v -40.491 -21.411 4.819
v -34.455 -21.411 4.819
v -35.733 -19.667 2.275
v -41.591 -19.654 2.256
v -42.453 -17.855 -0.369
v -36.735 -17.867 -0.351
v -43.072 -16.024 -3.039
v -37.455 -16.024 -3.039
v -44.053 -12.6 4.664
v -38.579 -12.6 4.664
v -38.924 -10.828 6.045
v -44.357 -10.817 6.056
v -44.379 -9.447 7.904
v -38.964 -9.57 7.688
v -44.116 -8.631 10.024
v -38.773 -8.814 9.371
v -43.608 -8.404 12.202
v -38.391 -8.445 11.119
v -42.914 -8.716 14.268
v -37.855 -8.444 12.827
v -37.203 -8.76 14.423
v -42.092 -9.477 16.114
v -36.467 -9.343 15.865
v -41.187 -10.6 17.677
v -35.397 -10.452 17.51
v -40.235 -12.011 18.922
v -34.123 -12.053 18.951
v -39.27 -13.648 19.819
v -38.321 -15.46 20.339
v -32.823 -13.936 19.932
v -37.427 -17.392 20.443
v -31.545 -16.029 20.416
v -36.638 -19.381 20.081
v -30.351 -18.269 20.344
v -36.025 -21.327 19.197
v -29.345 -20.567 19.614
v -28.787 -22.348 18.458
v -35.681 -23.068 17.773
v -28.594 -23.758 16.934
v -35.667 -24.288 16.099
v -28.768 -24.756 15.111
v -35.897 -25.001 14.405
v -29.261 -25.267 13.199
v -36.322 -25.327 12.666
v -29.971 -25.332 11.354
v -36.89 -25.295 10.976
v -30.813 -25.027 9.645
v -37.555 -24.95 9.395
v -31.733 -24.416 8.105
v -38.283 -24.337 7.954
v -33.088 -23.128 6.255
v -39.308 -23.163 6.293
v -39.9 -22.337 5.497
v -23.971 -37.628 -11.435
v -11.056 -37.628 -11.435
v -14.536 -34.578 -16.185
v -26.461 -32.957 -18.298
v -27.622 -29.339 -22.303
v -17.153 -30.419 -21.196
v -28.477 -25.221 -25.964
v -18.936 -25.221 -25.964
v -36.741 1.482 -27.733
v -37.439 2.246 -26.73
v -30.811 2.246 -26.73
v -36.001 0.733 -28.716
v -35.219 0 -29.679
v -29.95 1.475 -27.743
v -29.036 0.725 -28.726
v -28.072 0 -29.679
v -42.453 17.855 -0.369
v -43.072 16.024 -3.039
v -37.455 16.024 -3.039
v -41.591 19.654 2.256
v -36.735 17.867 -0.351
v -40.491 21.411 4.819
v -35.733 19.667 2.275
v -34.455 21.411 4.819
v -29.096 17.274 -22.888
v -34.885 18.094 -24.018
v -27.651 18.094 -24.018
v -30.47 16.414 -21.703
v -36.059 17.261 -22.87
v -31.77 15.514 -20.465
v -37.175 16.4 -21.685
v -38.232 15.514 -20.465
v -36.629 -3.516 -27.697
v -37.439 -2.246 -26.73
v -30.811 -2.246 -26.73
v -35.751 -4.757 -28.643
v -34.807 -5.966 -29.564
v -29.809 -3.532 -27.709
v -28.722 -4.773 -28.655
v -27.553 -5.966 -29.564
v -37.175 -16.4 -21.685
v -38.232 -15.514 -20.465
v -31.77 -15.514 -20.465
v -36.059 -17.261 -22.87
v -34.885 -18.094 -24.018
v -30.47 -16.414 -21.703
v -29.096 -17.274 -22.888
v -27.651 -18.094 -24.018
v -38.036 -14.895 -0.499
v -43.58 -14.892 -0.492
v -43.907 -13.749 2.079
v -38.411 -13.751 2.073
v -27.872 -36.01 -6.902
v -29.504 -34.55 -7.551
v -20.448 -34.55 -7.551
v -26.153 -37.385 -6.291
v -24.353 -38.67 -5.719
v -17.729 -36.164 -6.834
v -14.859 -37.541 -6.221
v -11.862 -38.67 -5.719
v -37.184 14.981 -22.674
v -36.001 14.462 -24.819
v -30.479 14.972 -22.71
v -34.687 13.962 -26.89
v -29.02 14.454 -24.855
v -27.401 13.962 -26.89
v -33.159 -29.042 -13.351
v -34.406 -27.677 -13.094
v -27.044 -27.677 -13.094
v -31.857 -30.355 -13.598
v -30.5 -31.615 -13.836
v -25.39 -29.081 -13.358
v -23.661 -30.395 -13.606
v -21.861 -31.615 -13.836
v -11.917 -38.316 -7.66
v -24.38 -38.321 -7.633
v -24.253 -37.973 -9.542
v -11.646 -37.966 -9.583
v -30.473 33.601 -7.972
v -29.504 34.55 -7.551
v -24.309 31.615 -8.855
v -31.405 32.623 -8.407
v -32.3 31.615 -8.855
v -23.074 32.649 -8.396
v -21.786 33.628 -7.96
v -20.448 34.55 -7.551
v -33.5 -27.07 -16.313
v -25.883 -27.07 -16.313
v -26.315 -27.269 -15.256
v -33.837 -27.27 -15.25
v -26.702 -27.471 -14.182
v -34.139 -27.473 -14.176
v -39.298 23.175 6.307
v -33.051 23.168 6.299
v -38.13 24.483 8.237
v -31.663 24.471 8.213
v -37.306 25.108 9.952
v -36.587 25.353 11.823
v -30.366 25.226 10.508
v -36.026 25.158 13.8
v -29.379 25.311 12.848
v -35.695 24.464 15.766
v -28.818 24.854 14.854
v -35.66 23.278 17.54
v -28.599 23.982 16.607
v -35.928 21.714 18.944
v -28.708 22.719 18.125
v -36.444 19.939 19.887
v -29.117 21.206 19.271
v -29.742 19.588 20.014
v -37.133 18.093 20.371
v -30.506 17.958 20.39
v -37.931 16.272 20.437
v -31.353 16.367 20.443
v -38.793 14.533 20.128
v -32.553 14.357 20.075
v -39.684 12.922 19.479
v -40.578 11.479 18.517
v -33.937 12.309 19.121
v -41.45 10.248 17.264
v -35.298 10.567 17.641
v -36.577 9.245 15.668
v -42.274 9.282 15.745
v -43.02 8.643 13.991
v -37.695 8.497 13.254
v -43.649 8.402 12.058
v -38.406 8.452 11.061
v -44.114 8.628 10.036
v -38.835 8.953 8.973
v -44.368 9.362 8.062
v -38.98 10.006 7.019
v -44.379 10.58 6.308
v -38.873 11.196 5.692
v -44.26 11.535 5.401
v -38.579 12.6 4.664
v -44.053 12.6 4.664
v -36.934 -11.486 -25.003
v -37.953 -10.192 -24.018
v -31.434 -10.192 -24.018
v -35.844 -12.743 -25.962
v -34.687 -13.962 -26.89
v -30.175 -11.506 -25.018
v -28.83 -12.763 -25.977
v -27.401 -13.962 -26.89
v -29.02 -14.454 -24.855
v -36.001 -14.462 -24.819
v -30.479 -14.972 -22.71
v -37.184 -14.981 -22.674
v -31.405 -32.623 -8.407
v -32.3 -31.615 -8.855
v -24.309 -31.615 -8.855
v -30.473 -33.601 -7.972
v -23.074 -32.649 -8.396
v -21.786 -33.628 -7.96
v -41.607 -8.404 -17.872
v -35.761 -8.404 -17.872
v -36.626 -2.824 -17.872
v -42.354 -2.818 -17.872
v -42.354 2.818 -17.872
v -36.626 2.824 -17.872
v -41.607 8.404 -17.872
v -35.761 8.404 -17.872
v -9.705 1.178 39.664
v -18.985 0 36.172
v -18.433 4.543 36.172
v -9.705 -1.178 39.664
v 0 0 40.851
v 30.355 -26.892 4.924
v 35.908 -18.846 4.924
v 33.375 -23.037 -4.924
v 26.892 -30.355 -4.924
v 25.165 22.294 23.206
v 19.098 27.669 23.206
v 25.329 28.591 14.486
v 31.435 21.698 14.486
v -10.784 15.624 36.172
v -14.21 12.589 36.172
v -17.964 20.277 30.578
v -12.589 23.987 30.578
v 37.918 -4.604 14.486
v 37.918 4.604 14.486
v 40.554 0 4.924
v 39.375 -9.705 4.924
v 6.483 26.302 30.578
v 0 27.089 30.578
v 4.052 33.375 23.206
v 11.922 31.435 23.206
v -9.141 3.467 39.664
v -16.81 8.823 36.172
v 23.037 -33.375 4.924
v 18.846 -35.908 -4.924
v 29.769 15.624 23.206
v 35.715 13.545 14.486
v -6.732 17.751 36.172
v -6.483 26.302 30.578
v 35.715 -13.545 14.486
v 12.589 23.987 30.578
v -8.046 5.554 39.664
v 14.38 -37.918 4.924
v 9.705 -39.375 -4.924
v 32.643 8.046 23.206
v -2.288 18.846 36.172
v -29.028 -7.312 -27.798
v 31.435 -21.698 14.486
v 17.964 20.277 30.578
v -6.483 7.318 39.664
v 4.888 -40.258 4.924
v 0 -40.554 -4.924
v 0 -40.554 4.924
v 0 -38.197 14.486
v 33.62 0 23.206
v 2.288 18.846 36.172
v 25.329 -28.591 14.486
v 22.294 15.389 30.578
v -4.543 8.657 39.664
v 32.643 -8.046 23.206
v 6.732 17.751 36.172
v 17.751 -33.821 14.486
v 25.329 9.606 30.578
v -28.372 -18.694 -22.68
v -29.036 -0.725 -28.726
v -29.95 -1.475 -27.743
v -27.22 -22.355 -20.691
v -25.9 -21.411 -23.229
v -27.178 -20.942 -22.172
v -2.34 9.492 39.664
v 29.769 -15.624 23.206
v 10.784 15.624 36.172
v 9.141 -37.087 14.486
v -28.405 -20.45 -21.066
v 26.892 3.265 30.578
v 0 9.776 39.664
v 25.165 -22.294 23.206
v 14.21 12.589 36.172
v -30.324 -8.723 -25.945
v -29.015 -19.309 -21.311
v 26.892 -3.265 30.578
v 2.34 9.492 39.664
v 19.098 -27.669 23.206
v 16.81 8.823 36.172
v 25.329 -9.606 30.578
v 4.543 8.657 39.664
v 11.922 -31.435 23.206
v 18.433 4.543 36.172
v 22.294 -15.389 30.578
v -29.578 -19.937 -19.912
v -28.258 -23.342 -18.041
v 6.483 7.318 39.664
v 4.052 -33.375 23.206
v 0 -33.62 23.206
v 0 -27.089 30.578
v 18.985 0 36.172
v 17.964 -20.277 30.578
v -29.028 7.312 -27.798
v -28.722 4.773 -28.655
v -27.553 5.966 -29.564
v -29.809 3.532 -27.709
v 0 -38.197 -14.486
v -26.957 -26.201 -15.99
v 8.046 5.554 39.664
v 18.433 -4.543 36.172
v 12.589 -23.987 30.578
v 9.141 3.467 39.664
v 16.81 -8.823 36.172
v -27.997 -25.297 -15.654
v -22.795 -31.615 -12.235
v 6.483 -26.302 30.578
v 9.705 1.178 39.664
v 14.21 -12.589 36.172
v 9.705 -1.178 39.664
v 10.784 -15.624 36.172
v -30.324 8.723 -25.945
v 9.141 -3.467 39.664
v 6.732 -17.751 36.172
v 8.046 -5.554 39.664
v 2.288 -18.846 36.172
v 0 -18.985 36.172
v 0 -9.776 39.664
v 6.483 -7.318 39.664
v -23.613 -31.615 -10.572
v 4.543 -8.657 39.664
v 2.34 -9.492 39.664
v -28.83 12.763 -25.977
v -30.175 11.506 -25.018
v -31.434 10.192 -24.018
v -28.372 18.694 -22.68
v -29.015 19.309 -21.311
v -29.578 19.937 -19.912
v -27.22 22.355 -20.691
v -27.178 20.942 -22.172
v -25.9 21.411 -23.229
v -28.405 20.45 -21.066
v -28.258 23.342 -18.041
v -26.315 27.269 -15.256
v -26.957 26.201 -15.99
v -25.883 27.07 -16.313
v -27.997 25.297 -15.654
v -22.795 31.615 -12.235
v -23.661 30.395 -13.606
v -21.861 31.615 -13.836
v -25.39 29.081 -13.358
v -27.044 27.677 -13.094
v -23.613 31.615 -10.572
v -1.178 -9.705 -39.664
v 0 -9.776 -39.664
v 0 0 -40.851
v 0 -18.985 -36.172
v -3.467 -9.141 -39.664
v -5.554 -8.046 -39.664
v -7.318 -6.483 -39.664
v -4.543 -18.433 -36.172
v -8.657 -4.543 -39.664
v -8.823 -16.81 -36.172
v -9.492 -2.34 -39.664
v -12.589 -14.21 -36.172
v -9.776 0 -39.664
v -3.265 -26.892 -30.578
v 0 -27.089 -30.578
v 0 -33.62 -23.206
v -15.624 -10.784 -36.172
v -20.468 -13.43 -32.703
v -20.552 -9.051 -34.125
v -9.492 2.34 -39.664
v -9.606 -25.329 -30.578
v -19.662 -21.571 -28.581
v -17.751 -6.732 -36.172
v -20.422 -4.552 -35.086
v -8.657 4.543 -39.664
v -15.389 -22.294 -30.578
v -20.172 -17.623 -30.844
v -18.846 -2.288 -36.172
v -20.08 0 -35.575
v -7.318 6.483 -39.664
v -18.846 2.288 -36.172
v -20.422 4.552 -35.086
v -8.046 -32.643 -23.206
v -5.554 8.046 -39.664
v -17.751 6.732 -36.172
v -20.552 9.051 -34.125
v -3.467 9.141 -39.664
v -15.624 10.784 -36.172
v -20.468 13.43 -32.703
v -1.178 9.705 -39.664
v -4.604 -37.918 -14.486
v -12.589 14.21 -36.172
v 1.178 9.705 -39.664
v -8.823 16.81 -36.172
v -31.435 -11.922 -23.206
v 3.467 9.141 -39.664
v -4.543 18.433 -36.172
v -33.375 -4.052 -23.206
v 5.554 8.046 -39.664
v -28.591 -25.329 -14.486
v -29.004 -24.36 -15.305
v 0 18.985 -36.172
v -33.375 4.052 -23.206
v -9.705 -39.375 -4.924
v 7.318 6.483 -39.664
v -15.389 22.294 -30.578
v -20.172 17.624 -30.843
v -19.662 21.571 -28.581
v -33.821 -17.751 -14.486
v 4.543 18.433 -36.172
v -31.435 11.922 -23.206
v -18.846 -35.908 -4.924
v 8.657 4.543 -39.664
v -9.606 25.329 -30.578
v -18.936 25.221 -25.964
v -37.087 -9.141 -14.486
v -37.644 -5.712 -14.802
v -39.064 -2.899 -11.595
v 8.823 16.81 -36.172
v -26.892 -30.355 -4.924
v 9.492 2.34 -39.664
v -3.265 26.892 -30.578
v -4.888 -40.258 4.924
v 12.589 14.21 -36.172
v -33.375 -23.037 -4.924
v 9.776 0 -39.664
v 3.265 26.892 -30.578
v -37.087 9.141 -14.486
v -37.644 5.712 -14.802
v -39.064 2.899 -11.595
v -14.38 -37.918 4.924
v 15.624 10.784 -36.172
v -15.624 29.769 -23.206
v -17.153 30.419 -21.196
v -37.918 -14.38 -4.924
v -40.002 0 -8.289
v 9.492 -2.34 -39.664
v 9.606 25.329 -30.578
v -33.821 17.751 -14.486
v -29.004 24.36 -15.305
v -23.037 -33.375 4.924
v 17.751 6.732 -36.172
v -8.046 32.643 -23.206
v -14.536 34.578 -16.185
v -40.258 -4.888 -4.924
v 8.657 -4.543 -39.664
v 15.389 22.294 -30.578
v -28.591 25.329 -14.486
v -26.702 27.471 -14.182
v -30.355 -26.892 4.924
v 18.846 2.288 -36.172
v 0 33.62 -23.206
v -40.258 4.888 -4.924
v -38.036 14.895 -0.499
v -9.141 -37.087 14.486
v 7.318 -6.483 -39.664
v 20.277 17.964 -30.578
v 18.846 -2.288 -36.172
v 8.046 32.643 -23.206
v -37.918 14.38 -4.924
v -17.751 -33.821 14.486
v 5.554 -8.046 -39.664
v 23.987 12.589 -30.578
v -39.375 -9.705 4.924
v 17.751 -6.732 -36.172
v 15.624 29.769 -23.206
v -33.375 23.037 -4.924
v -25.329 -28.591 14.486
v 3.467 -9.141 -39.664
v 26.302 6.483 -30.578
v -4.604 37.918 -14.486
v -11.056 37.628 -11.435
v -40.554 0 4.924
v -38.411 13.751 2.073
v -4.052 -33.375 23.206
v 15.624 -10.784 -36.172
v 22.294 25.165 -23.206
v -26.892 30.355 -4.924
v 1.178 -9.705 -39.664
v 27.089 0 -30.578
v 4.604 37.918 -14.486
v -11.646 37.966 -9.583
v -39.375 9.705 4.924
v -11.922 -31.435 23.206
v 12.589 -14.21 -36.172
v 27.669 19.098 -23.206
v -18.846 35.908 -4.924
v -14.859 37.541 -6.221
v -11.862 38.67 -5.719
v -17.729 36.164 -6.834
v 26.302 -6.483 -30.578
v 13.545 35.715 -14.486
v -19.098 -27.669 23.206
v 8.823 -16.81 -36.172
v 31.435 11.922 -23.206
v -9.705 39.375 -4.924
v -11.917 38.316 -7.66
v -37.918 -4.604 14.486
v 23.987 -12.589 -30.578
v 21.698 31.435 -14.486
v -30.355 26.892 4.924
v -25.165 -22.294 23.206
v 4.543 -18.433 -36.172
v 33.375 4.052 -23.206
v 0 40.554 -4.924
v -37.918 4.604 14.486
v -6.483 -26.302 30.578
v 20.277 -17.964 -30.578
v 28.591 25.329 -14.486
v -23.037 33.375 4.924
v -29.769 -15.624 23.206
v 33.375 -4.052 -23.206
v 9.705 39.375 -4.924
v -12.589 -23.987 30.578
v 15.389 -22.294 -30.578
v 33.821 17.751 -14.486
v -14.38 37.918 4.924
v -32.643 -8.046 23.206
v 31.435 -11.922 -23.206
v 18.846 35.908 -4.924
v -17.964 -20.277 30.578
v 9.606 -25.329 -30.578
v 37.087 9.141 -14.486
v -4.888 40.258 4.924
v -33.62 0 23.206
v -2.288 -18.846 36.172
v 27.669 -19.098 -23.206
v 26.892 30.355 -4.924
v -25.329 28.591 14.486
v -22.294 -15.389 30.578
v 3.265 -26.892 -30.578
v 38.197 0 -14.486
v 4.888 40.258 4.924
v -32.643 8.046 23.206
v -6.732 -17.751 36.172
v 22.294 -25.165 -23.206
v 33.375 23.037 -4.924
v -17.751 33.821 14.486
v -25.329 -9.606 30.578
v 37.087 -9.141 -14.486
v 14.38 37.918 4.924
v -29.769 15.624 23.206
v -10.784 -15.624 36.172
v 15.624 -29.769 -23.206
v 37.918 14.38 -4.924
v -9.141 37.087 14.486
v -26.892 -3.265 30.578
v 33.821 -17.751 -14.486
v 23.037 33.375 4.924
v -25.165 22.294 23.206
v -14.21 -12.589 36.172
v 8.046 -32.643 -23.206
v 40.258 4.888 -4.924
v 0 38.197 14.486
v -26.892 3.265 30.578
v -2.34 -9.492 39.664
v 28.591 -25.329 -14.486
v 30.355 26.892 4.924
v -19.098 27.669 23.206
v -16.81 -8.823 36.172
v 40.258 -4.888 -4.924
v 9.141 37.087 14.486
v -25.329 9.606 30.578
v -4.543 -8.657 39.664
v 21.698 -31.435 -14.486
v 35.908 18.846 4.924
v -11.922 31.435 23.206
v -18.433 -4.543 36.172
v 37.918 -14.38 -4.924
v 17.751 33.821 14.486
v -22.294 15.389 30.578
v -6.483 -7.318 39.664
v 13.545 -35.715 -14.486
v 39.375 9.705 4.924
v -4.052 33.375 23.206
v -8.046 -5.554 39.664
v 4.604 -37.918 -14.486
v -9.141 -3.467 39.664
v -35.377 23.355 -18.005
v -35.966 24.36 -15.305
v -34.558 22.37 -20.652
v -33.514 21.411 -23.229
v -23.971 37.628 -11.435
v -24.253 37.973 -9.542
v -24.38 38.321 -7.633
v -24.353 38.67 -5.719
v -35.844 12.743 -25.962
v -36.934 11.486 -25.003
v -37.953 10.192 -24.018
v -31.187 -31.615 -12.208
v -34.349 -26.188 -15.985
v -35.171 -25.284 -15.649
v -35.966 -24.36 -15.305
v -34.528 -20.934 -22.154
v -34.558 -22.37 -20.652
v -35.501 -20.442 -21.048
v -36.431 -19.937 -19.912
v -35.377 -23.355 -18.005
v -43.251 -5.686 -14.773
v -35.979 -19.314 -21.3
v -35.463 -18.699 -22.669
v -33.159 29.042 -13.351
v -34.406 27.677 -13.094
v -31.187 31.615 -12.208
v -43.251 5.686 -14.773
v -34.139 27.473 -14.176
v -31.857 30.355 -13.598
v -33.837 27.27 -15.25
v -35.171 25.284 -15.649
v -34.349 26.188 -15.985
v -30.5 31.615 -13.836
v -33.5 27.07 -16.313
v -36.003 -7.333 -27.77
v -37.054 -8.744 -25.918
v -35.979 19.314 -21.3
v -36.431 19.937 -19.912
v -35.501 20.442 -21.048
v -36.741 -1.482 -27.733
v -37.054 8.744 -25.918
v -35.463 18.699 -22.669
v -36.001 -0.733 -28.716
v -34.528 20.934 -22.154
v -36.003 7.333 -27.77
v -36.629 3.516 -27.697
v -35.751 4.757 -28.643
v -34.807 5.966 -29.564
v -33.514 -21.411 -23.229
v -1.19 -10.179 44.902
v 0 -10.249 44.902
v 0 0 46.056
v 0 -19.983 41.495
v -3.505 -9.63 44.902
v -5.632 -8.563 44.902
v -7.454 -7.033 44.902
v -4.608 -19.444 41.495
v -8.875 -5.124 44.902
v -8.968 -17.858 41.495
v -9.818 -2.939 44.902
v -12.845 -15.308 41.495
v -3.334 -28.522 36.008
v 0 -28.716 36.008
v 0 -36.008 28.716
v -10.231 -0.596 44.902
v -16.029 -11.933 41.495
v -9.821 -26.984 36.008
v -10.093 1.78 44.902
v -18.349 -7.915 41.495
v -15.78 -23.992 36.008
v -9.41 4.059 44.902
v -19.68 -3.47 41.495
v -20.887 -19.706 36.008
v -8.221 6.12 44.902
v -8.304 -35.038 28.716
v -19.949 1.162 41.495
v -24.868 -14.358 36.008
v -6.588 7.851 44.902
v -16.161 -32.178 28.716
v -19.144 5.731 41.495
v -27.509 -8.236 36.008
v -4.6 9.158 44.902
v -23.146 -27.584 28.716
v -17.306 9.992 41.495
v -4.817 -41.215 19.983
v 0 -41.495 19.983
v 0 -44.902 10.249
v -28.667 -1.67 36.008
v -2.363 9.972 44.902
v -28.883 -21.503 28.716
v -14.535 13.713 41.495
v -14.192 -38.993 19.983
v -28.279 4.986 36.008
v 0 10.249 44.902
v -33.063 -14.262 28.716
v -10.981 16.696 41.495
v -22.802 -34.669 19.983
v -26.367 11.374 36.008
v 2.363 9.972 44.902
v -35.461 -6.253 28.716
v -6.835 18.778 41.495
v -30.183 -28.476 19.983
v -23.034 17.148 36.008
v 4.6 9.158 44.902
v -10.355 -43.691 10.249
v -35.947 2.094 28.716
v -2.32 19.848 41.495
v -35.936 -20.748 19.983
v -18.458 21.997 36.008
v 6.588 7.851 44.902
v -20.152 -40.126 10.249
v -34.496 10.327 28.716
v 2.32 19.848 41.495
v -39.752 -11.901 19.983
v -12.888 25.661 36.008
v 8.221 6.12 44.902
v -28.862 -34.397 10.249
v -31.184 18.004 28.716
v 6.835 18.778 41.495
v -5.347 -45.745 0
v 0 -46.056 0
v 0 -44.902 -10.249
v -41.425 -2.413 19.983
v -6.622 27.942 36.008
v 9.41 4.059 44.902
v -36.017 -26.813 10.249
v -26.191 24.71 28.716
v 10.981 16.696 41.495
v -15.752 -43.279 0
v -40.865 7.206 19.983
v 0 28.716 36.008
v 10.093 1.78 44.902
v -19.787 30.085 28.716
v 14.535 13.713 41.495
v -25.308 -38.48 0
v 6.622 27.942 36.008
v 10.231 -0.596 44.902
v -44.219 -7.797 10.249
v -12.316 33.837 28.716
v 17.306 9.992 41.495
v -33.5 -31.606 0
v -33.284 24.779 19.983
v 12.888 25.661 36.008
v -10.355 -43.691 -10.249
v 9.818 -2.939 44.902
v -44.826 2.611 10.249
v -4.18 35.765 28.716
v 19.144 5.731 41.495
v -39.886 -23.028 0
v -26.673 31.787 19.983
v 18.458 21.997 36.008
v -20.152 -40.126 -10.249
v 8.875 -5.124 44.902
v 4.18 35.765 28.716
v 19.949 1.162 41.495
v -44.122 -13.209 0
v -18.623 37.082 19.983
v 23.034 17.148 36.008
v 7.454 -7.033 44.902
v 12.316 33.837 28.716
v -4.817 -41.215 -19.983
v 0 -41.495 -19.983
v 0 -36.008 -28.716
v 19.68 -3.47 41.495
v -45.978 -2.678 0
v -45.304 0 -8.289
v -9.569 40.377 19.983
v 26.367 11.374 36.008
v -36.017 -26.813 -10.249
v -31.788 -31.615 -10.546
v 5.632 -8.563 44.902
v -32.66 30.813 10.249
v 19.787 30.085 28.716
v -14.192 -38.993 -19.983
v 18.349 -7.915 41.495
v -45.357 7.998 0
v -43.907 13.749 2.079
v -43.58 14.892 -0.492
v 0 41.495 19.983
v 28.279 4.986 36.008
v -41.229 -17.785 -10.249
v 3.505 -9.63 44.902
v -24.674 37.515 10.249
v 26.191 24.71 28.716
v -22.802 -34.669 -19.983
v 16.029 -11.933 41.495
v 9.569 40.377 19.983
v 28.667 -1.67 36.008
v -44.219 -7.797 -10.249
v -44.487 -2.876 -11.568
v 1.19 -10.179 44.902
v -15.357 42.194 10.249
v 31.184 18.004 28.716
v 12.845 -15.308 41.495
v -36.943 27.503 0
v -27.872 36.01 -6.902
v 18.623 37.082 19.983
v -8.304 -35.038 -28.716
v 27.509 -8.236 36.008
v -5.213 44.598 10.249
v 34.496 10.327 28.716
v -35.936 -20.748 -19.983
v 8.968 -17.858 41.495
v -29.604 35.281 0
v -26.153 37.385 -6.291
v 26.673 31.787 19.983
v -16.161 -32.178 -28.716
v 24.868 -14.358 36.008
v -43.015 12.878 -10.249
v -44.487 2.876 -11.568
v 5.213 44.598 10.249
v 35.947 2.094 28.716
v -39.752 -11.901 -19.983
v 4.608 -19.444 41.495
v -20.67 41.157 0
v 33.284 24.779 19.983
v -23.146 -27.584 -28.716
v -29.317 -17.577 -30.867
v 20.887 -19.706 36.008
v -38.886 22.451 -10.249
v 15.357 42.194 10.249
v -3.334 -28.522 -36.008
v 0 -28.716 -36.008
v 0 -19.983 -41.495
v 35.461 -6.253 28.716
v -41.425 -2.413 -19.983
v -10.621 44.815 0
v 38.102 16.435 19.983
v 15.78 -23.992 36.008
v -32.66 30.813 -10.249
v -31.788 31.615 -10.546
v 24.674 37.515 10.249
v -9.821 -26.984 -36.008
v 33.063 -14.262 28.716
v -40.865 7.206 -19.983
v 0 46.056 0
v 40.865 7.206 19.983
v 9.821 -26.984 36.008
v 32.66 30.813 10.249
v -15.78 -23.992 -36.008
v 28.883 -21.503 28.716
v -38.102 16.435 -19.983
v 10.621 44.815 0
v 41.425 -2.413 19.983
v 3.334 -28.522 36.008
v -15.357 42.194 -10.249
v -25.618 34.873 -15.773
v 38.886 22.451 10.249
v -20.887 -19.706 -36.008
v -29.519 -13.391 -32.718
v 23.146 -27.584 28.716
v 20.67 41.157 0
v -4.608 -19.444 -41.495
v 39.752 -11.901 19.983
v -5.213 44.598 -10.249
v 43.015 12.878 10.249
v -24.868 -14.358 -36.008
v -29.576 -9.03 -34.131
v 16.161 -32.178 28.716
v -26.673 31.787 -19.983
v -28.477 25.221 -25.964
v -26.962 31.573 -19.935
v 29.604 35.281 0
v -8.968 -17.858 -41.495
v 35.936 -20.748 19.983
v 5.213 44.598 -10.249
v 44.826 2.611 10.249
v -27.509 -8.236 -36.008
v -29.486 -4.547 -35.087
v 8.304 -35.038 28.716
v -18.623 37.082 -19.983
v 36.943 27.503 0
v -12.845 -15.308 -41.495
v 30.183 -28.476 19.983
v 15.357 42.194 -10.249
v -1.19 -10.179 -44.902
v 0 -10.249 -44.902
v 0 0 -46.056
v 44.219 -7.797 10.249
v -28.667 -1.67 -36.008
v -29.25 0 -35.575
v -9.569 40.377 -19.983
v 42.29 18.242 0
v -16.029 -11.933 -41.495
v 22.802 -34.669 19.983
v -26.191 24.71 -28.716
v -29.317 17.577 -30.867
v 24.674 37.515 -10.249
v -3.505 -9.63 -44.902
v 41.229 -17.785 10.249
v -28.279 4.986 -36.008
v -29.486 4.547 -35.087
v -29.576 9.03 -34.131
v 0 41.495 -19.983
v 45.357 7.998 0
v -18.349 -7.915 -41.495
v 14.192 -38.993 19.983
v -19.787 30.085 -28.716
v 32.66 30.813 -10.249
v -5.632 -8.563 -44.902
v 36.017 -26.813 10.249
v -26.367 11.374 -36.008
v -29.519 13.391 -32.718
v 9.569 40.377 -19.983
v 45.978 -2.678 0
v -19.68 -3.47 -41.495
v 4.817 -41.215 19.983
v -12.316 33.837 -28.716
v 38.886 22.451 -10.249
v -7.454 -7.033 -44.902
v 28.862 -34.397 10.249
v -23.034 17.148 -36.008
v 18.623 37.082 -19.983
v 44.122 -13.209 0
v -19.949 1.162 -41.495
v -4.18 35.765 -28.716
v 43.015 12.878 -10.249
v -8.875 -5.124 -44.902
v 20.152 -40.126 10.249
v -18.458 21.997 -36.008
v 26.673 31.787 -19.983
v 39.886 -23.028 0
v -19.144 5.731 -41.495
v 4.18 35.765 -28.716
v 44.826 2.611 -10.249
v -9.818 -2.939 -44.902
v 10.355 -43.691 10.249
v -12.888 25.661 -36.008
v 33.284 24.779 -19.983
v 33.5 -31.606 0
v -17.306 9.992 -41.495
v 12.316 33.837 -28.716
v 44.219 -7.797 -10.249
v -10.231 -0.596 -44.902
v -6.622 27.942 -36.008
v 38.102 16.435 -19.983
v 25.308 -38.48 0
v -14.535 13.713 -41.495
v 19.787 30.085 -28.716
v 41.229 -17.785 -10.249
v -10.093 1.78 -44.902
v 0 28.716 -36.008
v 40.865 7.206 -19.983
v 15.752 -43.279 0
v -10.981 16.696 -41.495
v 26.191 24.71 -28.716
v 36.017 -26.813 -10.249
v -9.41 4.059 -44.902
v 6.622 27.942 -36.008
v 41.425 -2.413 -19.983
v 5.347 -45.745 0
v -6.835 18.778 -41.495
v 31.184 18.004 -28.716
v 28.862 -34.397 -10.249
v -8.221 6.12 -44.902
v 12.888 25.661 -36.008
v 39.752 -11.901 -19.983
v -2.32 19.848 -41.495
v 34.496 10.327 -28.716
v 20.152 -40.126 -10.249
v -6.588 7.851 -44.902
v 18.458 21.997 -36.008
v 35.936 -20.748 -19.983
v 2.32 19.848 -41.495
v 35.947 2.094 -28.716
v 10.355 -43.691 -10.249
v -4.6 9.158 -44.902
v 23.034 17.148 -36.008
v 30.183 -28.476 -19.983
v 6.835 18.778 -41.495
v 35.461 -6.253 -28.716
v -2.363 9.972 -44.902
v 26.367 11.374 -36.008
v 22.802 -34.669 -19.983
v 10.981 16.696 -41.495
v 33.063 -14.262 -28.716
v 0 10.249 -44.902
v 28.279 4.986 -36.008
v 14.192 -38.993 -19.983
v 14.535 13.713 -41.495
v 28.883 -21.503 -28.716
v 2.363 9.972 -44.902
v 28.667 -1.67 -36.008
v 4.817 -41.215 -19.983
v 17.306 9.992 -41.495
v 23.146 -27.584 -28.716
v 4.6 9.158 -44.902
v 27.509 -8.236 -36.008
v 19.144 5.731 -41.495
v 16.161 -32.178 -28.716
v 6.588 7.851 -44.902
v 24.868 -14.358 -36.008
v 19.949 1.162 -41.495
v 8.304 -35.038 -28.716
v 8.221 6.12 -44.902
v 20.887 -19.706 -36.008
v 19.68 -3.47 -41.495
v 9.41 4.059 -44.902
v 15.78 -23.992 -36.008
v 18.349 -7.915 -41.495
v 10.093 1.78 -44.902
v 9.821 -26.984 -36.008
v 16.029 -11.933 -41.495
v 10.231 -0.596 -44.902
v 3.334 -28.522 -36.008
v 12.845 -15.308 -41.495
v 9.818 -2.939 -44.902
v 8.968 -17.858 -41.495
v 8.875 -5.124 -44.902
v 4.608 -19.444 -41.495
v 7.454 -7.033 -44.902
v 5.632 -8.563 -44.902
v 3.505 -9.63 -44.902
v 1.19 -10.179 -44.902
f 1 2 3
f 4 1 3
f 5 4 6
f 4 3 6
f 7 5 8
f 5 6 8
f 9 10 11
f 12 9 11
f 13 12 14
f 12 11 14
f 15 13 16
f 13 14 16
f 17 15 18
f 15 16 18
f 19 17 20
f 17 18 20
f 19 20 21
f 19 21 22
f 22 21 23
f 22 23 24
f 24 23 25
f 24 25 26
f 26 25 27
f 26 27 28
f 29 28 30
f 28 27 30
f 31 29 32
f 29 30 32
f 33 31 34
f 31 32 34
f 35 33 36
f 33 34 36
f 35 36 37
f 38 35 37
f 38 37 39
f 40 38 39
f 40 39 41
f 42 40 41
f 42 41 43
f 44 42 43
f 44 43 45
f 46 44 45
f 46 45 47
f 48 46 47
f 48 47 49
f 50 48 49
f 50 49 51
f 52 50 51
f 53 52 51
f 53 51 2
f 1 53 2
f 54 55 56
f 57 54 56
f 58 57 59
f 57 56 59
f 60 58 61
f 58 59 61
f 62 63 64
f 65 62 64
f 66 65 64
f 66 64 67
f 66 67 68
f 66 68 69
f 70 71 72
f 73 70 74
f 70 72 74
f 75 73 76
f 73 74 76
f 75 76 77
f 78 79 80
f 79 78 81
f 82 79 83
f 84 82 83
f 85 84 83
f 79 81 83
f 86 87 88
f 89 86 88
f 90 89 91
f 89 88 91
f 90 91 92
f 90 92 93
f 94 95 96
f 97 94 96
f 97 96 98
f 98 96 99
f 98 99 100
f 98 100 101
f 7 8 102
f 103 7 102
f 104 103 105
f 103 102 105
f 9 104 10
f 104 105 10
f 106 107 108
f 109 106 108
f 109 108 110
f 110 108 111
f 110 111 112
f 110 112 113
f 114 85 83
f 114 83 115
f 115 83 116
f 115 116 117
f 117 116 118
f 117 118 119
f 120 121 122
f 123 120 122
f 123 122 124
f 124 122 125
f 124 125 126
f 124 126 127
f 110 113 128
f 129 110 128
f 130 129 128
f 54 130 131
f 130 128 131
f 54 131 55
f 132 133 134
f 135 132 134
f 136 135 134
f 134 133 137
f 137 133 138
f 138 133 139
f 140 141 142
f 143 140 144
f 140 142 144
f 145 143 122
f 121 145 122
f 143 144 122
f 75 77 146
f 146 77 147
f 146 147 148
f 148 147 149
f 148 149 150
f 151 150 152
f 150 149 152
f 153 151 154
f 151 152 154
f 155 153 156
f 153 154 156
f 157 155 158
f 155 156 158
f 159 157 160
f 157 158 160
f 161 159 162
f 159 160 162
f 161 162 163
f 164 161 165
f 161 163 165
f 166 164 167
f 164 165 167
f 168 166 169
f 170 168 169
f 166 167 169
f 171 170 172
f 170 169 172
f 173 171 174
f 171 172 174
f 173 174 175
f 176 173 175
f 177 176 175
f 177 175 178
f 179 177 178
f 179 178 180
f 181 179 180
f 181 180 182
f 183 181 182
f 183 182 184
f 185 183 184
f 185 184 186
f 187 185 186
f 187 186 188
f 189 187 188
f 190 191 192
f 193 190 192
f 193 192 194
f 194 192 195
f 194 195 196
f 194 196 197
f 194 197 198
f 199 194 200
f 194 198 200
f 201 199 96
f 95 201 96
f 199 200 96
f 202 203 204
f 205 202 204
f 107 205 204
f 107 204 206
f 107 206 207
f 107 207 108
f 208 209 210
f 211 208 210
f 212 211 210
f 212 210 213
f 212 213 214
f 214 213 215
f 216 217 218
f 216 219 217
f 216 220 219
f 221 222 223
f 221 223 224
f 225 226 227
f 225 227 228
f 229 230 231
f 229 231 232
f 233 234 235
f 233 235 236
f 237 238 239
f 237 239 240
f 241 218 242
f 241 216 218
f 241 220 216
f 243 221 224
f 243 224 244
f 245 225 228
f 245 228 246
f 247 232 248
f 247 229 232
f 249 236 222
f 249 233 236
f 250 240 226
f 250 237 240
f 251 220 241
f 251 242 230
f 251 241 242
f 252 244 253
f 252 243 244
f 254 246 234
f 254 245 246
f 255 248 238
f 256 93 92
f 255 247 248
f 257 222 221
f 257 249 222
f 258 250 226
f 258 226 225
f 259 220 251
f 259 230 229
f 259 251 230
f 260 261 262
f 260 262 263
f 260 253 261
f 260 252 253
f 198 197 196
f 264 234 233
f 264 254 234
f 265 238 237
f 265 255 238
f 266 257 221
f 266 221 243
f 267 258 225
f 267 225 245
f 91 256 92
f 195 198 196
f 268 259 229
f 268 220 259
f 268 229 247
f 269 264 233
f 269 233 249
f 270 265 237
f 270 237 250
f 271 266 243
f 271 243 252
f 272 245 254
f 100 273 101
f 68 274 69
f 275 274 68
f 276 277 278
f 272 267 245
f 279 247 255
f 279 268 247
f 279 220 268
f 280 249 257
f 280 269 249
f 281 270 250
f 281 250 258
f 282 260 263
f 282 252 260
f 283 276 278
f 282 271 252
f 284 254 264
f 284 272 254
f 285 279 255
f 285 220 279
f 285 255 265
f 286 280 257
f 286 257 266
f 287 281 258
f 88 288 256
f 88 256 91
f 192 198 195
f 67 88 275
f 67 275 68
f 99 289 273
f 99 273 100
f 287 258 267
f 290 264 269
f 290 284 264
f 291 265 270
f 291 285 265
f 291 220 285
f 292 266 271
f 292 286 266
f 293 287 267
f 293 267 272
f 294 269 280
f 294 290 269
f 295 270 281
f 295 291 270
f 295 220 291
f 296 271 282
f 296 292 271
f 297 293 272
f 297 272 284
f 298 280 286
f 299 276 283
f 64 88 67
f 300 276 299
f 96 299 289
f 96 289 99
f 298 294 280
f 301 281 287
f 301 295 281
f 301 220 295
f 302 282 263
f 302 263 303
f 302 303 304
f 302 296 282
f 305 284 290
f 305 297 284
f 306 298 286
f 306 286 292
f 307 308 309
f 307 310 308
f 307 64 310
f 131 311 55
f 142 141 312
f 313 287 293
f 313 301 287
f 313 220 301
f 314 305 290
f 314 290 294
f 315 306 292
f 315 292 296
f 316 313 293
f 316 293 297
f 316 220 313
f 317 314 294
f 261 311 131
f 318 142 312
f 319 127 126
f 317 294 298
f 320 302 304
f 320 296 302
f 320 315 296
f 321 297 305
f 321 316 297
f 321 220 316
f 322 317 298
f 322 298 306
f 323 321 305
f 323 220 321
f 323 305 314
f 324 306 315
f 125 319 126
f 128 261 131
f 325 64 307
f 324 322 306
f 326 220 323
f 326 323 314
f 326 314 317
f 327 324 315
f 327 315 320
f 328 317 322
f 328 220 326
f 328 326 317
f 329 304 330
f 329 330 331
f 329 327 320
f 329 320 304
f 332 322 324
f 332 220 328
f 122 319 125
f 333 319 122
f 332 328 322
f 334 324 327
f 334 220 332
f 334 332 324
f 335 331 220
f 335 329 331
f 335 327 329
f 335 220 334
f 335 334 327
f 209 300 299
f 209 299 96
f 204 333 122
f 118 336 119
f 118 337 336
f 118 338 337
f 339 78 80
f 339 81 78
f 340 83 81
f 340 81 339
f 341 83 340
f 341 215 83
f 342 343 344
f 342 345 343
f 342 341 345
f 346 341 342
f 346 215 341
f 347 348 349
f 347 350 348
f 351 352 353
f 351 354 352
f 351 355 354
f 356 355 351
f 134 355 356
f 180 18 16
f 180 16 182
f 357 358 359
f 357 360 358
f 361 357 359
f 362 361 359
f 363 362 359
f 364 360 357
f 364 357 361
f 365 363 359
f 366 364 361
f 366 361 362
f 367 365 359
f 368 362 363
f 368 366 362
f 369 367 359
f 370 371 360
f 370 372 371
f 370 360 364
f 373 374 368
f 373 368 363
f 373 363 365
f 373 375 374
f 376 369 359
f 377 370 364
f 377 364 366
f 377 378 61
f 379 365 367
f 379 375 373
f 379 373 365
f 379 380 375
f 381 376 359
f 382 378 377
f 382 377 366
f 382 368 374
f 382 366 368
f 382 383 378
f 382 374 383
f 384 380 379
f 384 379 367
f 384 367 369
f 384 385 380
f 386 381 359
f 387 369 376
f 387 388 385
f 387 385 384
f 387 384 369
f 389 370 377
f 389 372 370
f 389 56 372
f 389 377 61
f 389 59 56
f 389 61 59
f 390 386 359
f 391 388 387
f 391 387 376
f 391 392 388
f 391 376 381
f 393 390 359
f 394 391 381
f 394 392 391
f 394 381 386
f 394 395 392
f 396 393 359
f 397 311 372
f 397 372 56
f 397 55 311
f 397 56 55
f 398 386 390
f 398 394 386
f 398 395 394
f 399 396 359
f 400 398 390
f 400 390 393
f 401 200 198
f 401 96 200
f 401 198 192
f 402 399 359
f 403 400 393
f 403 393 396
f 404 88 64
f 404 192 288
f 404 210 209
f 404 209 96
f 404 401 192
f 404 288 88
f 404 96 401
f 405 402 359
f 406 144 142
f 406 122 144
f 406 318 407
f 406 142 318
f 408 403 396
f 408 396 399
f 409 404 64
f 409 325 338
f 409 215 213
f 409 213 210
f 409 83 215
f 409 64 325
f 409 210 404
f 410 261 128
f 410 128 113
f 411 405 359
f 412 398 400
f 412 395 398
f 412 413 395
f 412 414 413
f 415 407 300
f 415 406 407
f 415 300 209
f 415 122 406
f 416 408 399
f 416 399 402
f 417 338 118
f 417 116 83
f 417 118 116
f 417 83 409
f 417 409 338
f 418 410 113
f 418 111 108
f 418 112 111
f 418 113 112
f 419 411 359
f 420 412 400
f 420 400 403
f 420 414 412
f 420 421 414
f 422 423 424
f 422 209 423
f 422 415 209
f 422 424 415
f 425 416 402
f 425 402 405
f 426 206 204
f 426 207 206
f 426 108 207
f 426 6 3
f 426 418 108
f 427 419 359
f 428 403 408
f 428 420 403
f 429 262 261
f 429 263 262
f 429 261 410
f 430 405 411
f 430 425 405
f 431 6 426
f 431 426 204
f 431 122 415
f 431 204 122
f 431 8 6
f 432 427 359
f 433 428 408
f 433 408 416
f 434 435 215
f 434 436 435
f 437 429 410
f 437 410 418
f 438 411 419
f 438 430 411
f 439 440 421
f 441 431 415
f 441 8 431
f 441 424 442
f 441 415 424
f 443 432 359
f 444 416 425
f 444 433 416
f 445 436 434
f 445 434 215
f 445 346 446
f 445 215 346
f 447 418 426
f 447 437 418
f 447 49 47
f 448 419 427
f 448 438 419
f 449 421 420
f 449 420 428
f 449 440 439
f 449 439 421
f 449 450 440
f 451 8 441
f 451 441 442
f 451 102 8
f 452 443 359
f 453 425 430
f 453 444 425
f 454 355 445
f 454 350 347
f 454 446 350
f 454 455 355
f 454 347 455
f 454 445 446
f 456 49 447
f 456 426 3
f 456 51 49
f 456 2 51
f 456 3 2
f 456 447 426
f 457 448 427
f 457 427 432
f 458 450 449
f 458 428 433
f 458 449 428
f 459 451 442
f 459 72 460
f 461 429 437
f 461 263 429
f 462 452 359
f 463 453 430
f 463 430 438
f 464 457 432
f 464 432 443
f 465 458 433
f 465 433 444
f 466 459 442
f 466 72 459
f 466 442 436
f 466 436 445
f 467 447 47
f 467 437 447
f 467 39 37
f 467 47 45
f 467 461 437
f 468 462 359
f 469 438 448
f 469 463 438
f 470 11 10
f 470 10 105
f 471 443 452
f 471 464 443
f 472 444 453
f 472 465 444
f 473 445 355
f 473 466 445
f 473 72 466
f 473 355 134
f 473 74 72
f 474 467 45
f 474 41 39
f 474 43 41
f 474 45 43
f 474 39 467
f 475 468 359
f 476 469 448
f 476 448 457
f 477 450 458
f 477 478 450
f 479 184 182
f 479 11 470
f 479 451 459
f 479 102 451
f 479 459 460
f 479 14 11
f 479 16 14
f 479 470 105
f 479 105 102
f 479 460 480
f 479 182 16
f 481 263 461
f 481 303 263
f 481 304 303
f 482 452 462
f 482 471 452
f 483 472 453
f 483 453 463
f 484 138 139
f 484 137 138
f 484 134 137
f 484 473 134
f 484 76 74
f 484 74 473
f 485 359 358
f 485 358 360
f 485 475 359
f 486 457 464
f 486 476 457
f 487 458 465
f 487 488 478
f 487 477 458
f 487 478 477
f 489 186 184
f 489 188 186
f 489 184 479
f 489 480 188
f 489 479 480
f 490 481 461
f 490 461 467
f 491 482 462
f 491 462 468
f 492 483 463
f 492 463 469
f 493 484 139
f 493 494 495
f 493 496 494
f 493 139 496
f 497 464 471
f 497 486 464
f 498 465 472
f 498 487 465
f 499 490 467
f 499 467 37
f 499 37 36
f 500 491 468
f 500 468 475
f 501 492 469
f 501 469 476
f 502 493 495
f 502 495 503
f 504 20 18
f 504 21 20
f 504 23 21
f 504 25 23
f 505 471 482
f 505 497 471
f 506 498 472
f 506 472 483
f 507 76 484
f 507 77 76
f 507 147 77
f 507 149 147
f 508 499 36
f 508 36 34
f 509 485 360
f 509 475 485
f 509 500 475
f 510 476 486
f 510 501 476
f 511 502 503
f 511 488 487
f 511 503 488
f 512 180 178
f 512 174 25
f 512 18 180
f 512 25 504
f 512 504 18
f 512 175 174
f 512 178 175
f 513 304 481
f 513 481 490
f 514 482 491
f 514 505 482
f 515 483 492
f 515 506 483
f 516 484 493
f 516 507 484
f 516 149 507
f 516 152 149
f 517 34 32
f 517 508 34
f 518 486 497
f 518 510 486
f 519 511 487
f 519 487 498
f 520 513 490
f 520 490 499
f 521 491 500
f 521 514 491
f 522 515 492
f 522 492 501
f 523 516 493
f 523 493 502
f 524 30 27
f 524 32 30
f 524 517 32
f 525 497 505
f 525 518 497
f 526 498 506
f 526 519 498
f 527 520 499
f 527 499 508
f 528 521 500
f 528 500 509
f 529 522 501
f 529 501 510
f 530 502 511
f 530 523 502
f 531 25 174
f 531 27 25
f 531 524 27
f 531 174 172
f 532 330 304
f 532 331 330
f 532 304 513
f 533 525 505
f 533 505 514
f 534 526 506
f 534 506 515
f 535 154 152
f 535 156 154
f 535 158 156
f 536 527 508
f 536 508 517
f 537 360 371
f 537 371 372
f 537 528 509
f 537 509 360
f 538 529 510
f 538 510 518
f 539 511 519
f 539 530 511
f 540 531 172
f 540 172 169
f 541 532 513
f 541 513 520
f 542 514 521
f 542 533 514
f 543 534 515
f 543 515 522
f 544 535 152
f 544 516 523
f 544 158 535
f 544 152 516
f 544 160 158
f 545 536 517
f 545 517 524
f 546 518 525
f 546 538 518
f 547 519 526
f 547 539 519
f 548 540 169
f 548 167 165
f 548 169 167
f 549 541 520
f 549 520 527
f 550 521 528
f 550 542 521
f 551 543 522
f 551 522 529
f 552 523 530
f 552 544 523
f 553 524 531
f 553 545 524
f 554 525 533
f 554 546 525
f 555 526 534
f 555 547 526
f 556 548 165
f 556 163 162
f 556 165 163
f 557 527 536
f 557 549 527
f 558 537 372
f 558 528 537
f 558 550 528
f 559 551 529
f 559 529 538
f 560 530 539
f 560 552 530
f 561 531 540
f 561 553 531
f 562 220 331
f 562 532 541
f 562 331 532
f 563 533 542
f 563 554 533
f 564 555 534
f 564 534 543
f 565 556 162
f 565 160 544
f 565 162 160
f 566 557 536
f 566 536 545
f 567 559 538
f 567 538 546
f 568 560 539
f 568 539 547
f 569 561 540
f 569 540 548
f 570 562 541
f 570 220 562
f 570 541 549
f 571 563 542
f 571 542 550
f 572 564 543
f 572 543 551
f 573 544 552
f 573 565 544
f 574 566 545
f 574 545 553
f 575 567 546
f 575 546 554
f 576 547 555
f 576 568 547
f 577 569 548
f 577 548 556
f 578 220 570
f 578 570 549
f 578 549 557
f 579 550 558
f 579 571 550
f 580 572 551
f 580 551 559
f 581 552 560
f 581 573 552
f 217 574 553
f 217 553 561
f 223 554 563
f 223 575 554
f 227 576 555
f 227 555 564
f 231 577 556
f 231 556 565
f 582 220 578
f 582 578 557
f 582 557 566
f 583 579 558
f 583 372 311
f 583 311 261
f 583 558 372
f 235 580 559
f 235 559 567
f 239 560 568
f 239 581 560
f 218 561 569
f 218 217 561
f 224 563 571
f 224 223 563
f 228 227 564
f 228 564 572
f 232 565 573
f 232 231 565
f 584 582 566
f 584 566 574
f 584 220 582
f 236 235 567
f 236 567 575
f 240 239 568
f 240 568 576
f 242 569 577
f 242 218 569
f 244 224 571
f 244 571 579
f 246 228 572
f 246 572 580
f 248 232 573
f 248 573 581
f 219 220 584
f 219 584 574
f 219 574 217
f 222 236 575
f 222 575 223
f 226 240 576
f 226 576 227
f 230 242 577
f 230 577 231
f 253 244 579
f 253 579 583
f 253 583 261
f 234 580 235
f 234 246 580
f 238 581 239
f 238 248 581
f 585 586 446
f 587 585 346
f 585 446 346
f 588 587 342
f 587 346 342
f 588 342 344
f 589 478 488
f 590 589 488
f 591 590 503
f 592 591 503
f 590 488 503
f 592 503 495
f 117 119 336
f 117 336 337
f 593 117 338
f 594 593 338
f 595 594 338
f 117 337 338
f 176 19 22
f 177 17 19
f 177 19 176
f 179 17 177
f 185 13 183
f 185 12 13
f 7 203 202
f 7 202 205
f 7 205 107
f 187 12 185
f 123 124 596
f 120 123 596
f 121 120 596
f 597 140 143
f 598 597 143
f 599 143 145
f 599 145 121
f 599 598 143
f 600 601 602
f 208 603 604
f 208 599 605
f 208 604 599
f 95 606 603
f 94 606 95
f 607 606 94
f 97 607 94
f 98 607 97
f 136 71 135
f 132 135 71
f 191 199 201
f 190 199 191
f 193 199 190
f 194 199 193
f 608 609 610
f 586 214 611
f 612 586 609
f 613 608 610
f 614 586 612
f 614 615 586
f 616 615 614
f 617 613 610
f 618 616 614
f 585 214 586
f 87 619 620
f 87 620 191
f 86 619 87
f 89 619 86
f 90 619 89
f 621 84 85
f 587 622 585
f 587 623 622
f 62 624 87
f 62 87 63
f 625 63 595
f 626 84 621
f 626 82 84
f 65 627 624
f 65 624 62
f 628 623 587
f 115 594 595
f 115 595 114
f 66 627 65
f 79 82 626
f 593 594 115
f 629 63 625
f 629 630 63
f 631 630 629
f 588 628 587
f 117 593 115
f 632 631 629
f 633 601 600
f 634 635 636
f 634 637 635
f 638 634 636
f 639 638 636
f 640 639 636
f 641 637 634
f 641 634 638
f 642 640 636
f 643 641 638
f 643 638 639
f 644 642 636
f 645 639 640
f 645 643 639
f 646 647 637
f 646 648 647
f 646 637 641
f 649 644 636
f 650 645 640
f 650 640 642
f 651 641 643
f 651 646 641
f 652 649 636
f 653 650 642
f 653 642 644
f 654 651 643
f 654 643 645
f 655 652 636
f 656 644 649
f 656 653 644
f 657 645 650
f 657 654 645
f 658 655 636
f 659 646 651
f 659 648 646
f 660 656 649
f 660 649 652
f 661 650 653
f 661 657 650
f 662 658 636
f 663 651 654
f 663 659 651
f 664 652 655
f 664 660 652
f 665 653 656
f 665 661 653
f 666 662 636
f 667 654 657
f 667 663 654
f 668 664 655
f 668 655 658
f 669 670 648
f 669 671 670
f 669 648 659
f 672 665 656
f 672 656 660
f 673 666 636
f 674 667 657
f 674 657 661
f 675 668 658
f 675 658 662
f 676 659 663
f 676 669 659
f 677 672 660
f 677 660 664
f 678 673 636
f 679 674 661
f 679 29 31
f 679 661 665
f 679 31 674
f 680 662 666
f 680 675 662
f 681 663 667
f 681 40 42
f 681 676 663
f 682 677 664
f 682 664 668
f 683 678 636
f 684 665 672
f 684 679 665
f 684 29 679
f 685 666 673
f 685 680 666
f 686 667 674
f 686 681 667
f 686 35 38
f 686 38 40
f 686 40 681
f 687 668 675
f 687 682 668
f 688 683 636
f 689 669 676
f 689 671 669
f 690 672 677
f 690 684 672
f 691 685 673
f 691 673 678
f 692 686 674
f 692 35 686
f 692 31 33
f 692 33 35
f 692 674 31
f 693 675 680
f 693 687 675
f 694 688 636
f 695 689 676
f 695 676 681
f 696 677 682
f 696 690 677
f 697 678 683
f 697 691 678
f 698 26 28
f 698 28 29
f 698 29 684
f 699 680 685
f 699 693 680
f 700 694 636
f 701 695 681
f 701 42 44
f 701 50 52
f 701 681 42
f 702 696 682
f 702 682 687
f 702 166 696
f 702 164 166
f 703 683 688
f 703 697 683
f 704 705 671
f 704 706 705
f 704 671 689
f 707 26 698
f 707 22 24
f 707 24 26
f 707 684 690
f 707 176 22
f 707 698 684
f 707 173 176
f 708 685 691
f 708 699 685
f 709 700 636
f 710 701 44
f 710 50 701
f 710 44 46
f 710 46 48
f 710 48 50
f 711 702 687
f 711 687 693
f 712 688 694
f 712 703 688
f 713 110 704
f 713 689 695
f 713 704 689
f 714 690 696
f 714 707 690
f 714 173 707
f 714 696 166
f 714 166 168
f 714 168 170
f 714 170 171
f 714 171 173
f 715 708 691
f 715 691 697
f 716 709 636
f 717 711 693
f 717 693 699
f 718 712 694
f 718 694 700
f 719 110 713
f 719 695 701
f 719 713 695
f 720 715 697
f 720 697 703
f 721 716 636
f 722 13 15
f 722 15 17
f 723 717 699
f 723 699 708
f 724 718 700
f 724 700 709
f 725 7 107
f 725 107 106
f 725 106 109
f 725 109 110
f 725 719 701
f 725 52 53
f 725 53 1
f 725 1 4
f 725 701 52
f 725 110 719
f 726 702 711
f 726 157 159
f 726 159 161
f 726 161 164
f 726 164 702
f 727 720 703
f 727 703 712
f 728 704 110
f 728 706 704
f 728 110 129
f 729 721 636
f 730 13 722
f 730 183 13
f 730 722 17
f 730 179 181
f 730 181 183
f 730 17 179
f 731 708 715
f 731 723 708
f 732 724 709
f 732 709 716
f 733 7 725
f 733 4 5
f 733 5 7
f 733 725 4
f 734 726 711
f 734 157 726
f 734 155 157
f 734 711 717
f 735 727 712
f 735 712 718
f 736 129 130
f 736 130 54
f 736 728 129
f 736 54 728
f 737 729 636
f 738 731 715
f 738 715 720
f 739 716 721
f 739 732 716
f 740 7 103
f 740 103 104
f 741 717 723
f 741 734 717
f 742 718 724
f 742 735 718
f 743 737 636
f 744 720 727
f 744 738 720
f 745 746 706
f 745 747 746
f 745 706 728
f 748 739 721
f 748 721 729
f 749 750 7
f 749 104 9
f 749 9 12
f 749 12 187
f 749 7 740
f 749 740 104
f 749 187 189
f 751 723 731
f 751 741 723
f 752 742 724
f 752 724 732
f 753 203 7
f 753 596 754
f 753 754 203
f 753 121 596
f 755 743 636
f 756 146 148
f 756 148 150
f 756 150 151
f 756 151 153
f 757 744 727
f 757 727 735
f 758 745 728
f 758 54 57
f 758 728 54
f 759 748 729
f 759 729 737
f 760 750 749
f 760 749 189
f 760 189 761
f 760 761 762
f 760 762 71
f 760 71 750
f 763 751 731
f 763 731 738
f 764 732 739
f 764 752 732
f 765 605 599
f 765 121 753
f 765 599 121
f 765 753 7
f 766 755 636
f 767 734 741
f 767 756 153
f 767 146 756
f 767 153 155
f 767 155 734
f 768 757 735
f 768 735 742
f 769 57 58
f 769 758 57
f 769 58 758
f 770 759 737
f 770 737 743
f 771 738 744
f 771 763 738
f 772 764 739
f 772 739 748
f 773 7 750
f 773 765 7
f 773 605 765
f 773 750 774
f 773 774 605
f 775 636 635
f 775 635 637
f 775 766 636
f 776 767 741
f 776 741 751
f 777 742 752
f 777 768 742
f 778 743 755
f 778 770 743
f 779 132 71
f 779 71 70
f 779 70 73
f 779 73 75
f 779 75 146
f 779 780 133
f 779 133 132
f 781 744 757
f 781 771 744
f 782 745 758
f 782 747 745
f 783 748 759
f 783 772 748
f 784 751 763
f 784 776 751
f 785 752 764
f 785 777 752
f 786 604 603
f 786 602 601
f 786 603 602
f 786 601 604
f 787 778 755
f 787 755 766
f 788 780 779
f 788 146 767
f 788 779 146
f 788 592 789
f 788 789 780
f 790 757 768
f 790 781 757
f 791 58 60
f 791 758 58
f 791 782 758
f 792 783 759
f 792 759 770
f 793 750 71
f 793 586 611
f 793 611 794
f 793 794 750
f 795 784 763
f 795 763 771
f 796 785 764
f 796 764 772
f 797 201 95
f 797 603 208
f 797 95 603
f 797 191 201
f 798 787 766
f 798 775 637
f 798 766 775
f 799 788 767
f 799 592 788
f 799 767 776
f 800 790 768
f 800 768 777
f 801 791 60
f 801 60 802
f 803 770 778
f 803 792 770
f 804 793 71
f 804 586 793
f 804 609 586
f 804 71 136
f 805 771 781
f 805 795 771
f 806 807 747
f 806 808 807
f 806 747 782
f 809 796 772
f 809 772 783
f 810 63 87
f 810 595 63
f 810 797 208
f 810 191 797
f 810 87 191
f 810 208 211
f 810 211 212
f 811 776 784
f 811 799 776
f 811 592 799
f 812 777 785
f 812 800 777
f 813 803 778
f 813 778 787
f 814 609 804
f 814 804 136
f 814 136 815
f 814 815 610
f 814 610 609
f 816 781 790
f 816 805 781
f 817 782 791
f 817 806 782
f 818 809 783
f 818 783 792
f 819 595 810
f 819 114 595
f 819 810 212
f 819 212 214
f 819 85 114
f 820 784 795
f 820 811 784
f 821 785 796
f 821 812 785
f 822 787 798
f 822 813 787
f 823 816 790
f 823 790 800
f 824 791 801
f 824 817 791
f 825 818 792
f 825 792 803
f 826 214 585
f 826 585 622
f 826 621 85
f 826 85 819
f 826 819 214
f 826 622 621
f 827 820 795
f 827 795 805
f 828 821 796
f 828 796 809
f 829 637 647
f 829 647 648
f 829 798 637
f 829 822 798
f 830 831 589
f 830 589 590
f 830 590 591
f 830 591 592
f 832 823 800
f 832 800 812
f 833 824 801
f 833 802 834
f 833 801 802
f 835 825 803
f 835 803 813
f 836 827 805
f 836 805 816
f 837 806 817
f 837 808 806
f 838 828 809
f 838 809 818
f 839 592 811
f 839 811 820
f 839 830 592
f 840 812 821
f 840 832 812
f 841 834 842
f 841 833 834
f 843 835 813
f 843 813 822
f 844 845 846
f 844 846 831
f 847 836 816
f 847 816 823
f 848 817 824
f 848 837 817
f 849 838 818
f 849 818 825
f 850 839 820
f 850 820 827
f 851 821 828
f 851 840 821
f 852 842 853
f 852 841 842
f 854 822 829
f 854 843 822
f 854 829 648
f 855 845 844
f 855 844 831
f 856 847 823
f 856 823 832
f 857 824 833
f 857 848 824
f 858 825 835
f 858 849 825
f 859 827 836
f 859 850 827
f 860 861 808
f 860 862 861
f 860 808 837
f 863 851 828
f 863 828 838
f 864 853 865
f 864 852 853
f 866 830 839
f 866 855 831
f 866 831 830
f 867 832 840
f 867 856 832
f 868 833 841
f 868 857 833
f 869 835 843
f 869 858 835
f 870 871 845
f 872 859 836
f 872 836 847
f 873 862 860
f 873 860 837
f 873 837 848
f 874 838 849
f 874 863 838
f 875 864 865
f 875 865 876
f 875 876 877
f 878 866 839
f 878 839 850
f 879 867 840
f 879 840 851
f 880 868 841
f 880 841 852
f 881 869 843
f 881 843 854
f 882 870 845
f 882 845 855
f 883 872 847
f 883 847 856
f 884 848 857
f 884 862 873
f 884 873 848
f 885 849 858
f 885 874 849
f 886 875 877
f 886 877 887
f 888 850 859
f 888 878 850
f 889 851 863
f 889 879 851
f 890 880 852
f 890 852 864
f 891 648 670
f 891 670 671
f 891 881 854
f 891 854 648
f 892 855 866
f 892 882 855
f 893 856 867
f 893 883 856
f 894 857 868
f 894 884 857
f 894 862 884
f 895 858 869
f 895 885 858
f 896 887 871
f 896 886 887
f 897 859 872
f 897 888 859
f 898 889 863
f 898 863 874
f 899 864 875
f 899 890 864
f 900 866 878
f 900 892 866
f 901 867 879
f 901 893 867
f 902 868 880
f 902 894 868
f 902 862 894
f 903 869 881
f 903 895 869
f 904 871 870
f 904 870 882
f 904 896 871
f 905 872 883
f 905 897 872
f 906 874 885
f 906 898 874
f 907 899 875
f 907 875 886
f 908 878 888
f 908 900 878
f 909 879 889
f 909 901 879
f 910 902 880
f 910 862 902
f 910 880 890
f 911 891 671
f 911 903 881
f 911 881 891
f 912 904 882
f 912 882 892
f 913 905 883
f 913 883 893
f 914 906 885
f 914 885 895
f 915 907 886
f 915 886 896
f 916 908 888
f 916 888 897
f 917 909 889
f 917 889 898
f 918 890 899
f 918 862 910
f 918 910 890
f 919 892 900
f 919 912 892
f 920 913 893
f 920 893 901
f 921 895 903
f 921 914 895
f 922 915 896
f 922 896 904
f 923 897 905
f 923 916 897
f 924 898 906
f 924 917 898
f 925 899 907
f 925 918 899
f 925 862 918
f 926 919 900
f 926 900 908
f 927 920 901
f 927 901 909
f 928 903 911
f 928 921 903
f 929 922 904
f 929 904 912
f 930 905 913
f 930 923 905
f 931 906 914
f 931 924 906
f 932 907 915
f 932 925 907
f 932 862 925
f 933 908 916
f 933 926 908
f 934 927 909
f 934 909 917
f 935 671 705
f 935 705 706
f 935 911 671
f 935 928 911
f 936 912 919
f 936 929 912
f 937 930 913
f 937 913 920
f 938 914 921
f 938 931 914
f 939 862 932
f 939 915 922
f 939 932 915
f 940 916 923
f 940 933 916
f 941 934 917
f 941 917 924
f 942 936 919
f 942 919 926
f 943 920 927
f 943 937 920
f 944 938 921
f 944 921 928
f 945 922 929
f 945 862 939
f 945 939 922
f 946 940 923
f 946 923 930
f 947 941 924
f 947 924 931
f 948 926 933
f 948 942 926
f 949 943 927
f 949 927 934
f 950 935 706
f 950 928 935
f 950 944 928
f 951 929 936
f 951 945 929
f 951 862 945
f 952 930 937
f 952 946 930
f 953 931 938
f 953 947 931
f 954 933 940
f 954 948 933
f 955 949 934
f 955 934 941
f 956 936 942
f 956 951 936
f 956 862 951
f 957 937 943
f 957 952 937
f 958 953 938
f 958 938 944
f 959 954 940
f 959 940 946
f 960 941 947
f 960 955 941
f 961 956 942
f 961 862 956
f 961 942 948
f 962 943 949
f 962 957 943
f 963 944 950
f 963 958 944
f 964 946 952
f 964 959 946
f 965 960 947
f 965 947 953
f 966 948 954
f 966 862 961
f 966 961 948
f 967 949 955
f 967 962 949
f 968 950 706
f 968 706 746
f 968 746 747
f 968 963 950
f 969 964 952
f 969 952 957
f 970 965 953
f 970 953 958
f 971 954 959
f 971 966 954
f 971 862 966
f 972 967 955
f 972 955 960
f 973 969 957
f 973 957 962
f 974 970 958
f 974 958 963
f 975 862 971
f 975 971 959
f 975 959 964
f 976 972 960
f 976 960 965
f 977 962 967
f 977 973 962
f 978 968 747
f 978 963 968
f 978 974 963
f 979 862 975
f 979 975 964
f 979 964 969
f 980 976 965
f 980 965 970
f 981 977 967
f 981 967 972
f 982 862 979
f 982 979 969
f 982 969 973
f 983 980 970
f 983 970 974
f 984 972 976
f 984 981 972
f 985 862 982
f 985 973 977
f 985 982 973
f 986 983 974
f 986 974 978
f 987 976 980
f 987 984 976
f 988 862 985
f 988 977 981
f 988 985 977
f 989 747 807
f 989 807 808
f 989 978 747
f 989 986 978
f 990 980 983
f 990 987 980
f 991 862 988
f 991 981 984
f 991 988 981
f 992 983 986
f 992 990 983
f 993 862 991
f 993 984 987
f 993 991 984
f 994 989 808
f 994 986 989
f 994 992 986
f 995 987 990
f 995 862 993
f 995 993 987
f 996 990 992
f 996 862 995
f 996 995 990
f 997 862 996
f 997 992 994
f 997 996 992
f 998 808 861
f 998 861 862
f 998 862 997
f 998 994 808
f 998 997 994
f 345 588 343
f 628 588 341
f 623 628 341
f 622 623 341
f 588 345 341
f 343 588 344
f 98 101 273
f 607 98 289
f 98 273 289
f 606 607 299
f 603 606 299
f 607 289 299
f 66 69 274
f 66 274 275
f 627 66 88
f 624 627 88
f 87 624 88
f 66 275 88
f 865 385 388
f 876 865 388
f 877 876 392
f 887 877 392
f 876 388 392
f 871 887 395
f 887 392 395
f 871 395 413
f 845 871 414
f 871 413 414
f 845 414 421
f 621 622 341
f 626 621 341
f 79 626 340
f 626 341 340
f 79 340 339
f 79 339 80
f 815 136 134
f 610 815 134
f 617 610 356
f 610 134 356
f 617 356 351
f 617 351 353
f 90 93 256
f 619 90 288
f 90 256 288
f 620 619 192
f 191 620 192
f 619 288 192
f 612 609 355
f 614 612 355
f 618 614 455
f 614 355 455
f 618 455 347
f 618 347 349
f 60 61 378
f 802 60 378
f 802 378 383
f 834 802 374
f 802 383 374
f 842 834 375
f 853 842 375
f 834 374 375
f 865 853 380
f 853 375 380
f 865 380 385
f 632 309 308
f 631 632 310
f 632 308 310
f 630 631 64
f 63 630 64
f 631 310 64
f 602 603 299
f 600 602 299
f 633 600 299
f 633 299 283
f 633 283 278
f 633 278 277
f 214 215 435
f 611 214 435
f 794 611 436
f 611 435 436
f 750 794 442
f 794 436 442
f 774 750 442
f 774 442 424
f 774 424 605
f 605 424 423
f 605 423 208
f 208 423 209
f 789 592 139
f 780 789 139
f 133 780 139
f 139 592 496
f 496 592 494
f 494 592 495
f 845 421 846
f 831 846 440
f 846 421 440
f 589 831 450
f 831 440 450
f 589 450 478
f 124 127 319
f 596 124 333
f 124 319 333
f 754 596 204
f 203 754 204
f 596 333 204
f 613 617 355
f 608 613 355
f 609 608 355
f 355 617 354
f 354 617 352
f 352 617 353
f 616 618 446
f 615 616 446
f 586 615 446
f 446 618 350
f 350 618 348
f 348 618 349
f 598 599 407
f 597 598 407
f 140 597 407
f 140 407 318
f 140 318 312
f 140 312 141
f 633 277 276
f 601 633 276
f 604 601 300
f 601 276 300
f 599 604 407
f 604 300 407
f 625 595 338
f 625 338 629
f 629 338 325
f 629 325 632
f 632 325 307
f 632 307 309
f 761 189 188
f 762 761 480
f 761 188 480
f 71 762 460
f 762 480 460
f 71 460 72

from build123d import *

# Parameters (mm, degrees)
F3_DEPTH = 96.774


with BuildPart() as f1:
    # F0 (on Right) → F1 (revolve)
    with BuildSketch(Plane.YZ):
        with BuildLine():
            Line((0, 40.851373), (0, 46.056358))
            ThreePointArc((0, 46.056358), (-46.056358, 0), (0, -46.056358))
            Line((0, -46.056358), (0, -40.851373))
            ThreePointArc((0, -40.851373), (-40.851373, 0), (0, 40.851373))
        make_face()
    revolve(axis=Axis((0, 0, 0), (0, 0, -1)))

    # F2 (on Right) → F3 (cut)
    with BuildSketch(Plane.YZ):
        with BuildLine():
            Line((16.023596, -3.039083), (21.411188, 4.818909))
            ThreePointArc((21.411188, 4.818909), (16.728984, 20.457276), (12.60009, 4.663802))
            Line((12.60009, 4.663802), (16.023596, -3.039083))
        make_face()
        Polygon((8.403815, -17.871678), (0, -8.289249), (-8.403815, -17.871678), (0, -17.871678), align=None)
        with BuildLine():
            Line((2.246329, -26.7301), (0, -29.67854))
            Line((0, -29.67854), (-2.246329, -26.7301))
            Line((-2.246329, -26.7301), (-5.966321, -29.564251))
            Line((-5.966321, -29.564251), (-10.19208, -24.017691))
            Line((-10.19208, -24.017691), (-13.962149, -26.889995))
            Line((-13.962149, -26.889995), (-15.514309, -20.464664))
            Line((-15.514309, -20.464664), (-18.094193, -24.017691))
            Line((-18.094193, -24.017691), (-19.936968, -19.911833))
            Line((-19.936968, -19.911833), (-21.411188, -23.228828))
            Line((-21.411188, -23.228828), (-24.359627, -15.304895))
            Line((-24.359627, -15.304895), (-27.069951, -16.313387))
            Line((-27.069951, -16.313387), (-27.676621, -13.093566))
            Line((-27.676621, -13.093566), (-31.614962, -13.835618))
            Line((-31.614962, -13.835618), (-31.614962, -8.855184))
            Line((-31.614962, -8.855184), (-34.549884, -7.550773))
            Line((-34.549884, -7.550773), (-38.670481, -5.719396))
            Line((-38.670481, -5.719396), (-37.627608, -11.435068))
            ThreePointArc((-37.627608, -11.435068), (-32.125537, -19.298328), (-25.221294, -25.96429))
            ThreePointArc((-25.221294, -25.96429), (-13.357962, -32.730942), (0, -35.57542))
            ThreePointArc((0, -35.57542), (13.357962, -32.730942), (25.221294, -25.96429))
            ThreePointArc((25.221294, -25.96429), (32.125537, -19.298328), (37.627608, -11.435068))
            Line((37.627608, -11.435068), (38.670481, -5.719396))
            Line((38.670481, -5.719396), (34.549884, -7.550773))
            Line((34.549884, -7.550773), (31.614962, -8.855184))
            Line((31.614962, -8.855184), (31.614962, -13.835618))
            Line((31.614962, -13.835618), (27.676621, -13.093566))
            Line((27.676621, -13.093566), (27.069951, -16.313387))
            Line((27.069951, -16.313387), (24.359627, -15.304895))
            Line((24.359627, -15.304895), (21.411188, -23.228828))
            Line((21.411188, -23.228828), (19.936968, -19.911833))
            Line((19.936968, -19.911833), (18.094193, -24.017691))
            Line((18.094193, -24.017691), (15.514309, -20.464664))
            Line((15.514309, -20.464664), (13.962149, -26.889995))
            Line((13.962149, -26.889995), (10.19208, -24.017691))
            Line((10.19208, -24.017691), (5.966321, -29.564251))
            Line((5.966321, -29.564251), (2.246329, -26.7301))
        make_face()
        with BuildLine():
            ThreePointArc((-12.60009, 4.663802), (-16.728984, 20.457276), (-21.411188, 4.818909))
            Line((-21.411188, 4.818909), (-16.023596, -3.039083))
            Line((-16.023596, -3.039083), (-12.60009, 4.663802))
        make_face()
    extrude(amount=-F3_DEPTH, mode=Mode.SUBTRACT)


solid = f1.part
